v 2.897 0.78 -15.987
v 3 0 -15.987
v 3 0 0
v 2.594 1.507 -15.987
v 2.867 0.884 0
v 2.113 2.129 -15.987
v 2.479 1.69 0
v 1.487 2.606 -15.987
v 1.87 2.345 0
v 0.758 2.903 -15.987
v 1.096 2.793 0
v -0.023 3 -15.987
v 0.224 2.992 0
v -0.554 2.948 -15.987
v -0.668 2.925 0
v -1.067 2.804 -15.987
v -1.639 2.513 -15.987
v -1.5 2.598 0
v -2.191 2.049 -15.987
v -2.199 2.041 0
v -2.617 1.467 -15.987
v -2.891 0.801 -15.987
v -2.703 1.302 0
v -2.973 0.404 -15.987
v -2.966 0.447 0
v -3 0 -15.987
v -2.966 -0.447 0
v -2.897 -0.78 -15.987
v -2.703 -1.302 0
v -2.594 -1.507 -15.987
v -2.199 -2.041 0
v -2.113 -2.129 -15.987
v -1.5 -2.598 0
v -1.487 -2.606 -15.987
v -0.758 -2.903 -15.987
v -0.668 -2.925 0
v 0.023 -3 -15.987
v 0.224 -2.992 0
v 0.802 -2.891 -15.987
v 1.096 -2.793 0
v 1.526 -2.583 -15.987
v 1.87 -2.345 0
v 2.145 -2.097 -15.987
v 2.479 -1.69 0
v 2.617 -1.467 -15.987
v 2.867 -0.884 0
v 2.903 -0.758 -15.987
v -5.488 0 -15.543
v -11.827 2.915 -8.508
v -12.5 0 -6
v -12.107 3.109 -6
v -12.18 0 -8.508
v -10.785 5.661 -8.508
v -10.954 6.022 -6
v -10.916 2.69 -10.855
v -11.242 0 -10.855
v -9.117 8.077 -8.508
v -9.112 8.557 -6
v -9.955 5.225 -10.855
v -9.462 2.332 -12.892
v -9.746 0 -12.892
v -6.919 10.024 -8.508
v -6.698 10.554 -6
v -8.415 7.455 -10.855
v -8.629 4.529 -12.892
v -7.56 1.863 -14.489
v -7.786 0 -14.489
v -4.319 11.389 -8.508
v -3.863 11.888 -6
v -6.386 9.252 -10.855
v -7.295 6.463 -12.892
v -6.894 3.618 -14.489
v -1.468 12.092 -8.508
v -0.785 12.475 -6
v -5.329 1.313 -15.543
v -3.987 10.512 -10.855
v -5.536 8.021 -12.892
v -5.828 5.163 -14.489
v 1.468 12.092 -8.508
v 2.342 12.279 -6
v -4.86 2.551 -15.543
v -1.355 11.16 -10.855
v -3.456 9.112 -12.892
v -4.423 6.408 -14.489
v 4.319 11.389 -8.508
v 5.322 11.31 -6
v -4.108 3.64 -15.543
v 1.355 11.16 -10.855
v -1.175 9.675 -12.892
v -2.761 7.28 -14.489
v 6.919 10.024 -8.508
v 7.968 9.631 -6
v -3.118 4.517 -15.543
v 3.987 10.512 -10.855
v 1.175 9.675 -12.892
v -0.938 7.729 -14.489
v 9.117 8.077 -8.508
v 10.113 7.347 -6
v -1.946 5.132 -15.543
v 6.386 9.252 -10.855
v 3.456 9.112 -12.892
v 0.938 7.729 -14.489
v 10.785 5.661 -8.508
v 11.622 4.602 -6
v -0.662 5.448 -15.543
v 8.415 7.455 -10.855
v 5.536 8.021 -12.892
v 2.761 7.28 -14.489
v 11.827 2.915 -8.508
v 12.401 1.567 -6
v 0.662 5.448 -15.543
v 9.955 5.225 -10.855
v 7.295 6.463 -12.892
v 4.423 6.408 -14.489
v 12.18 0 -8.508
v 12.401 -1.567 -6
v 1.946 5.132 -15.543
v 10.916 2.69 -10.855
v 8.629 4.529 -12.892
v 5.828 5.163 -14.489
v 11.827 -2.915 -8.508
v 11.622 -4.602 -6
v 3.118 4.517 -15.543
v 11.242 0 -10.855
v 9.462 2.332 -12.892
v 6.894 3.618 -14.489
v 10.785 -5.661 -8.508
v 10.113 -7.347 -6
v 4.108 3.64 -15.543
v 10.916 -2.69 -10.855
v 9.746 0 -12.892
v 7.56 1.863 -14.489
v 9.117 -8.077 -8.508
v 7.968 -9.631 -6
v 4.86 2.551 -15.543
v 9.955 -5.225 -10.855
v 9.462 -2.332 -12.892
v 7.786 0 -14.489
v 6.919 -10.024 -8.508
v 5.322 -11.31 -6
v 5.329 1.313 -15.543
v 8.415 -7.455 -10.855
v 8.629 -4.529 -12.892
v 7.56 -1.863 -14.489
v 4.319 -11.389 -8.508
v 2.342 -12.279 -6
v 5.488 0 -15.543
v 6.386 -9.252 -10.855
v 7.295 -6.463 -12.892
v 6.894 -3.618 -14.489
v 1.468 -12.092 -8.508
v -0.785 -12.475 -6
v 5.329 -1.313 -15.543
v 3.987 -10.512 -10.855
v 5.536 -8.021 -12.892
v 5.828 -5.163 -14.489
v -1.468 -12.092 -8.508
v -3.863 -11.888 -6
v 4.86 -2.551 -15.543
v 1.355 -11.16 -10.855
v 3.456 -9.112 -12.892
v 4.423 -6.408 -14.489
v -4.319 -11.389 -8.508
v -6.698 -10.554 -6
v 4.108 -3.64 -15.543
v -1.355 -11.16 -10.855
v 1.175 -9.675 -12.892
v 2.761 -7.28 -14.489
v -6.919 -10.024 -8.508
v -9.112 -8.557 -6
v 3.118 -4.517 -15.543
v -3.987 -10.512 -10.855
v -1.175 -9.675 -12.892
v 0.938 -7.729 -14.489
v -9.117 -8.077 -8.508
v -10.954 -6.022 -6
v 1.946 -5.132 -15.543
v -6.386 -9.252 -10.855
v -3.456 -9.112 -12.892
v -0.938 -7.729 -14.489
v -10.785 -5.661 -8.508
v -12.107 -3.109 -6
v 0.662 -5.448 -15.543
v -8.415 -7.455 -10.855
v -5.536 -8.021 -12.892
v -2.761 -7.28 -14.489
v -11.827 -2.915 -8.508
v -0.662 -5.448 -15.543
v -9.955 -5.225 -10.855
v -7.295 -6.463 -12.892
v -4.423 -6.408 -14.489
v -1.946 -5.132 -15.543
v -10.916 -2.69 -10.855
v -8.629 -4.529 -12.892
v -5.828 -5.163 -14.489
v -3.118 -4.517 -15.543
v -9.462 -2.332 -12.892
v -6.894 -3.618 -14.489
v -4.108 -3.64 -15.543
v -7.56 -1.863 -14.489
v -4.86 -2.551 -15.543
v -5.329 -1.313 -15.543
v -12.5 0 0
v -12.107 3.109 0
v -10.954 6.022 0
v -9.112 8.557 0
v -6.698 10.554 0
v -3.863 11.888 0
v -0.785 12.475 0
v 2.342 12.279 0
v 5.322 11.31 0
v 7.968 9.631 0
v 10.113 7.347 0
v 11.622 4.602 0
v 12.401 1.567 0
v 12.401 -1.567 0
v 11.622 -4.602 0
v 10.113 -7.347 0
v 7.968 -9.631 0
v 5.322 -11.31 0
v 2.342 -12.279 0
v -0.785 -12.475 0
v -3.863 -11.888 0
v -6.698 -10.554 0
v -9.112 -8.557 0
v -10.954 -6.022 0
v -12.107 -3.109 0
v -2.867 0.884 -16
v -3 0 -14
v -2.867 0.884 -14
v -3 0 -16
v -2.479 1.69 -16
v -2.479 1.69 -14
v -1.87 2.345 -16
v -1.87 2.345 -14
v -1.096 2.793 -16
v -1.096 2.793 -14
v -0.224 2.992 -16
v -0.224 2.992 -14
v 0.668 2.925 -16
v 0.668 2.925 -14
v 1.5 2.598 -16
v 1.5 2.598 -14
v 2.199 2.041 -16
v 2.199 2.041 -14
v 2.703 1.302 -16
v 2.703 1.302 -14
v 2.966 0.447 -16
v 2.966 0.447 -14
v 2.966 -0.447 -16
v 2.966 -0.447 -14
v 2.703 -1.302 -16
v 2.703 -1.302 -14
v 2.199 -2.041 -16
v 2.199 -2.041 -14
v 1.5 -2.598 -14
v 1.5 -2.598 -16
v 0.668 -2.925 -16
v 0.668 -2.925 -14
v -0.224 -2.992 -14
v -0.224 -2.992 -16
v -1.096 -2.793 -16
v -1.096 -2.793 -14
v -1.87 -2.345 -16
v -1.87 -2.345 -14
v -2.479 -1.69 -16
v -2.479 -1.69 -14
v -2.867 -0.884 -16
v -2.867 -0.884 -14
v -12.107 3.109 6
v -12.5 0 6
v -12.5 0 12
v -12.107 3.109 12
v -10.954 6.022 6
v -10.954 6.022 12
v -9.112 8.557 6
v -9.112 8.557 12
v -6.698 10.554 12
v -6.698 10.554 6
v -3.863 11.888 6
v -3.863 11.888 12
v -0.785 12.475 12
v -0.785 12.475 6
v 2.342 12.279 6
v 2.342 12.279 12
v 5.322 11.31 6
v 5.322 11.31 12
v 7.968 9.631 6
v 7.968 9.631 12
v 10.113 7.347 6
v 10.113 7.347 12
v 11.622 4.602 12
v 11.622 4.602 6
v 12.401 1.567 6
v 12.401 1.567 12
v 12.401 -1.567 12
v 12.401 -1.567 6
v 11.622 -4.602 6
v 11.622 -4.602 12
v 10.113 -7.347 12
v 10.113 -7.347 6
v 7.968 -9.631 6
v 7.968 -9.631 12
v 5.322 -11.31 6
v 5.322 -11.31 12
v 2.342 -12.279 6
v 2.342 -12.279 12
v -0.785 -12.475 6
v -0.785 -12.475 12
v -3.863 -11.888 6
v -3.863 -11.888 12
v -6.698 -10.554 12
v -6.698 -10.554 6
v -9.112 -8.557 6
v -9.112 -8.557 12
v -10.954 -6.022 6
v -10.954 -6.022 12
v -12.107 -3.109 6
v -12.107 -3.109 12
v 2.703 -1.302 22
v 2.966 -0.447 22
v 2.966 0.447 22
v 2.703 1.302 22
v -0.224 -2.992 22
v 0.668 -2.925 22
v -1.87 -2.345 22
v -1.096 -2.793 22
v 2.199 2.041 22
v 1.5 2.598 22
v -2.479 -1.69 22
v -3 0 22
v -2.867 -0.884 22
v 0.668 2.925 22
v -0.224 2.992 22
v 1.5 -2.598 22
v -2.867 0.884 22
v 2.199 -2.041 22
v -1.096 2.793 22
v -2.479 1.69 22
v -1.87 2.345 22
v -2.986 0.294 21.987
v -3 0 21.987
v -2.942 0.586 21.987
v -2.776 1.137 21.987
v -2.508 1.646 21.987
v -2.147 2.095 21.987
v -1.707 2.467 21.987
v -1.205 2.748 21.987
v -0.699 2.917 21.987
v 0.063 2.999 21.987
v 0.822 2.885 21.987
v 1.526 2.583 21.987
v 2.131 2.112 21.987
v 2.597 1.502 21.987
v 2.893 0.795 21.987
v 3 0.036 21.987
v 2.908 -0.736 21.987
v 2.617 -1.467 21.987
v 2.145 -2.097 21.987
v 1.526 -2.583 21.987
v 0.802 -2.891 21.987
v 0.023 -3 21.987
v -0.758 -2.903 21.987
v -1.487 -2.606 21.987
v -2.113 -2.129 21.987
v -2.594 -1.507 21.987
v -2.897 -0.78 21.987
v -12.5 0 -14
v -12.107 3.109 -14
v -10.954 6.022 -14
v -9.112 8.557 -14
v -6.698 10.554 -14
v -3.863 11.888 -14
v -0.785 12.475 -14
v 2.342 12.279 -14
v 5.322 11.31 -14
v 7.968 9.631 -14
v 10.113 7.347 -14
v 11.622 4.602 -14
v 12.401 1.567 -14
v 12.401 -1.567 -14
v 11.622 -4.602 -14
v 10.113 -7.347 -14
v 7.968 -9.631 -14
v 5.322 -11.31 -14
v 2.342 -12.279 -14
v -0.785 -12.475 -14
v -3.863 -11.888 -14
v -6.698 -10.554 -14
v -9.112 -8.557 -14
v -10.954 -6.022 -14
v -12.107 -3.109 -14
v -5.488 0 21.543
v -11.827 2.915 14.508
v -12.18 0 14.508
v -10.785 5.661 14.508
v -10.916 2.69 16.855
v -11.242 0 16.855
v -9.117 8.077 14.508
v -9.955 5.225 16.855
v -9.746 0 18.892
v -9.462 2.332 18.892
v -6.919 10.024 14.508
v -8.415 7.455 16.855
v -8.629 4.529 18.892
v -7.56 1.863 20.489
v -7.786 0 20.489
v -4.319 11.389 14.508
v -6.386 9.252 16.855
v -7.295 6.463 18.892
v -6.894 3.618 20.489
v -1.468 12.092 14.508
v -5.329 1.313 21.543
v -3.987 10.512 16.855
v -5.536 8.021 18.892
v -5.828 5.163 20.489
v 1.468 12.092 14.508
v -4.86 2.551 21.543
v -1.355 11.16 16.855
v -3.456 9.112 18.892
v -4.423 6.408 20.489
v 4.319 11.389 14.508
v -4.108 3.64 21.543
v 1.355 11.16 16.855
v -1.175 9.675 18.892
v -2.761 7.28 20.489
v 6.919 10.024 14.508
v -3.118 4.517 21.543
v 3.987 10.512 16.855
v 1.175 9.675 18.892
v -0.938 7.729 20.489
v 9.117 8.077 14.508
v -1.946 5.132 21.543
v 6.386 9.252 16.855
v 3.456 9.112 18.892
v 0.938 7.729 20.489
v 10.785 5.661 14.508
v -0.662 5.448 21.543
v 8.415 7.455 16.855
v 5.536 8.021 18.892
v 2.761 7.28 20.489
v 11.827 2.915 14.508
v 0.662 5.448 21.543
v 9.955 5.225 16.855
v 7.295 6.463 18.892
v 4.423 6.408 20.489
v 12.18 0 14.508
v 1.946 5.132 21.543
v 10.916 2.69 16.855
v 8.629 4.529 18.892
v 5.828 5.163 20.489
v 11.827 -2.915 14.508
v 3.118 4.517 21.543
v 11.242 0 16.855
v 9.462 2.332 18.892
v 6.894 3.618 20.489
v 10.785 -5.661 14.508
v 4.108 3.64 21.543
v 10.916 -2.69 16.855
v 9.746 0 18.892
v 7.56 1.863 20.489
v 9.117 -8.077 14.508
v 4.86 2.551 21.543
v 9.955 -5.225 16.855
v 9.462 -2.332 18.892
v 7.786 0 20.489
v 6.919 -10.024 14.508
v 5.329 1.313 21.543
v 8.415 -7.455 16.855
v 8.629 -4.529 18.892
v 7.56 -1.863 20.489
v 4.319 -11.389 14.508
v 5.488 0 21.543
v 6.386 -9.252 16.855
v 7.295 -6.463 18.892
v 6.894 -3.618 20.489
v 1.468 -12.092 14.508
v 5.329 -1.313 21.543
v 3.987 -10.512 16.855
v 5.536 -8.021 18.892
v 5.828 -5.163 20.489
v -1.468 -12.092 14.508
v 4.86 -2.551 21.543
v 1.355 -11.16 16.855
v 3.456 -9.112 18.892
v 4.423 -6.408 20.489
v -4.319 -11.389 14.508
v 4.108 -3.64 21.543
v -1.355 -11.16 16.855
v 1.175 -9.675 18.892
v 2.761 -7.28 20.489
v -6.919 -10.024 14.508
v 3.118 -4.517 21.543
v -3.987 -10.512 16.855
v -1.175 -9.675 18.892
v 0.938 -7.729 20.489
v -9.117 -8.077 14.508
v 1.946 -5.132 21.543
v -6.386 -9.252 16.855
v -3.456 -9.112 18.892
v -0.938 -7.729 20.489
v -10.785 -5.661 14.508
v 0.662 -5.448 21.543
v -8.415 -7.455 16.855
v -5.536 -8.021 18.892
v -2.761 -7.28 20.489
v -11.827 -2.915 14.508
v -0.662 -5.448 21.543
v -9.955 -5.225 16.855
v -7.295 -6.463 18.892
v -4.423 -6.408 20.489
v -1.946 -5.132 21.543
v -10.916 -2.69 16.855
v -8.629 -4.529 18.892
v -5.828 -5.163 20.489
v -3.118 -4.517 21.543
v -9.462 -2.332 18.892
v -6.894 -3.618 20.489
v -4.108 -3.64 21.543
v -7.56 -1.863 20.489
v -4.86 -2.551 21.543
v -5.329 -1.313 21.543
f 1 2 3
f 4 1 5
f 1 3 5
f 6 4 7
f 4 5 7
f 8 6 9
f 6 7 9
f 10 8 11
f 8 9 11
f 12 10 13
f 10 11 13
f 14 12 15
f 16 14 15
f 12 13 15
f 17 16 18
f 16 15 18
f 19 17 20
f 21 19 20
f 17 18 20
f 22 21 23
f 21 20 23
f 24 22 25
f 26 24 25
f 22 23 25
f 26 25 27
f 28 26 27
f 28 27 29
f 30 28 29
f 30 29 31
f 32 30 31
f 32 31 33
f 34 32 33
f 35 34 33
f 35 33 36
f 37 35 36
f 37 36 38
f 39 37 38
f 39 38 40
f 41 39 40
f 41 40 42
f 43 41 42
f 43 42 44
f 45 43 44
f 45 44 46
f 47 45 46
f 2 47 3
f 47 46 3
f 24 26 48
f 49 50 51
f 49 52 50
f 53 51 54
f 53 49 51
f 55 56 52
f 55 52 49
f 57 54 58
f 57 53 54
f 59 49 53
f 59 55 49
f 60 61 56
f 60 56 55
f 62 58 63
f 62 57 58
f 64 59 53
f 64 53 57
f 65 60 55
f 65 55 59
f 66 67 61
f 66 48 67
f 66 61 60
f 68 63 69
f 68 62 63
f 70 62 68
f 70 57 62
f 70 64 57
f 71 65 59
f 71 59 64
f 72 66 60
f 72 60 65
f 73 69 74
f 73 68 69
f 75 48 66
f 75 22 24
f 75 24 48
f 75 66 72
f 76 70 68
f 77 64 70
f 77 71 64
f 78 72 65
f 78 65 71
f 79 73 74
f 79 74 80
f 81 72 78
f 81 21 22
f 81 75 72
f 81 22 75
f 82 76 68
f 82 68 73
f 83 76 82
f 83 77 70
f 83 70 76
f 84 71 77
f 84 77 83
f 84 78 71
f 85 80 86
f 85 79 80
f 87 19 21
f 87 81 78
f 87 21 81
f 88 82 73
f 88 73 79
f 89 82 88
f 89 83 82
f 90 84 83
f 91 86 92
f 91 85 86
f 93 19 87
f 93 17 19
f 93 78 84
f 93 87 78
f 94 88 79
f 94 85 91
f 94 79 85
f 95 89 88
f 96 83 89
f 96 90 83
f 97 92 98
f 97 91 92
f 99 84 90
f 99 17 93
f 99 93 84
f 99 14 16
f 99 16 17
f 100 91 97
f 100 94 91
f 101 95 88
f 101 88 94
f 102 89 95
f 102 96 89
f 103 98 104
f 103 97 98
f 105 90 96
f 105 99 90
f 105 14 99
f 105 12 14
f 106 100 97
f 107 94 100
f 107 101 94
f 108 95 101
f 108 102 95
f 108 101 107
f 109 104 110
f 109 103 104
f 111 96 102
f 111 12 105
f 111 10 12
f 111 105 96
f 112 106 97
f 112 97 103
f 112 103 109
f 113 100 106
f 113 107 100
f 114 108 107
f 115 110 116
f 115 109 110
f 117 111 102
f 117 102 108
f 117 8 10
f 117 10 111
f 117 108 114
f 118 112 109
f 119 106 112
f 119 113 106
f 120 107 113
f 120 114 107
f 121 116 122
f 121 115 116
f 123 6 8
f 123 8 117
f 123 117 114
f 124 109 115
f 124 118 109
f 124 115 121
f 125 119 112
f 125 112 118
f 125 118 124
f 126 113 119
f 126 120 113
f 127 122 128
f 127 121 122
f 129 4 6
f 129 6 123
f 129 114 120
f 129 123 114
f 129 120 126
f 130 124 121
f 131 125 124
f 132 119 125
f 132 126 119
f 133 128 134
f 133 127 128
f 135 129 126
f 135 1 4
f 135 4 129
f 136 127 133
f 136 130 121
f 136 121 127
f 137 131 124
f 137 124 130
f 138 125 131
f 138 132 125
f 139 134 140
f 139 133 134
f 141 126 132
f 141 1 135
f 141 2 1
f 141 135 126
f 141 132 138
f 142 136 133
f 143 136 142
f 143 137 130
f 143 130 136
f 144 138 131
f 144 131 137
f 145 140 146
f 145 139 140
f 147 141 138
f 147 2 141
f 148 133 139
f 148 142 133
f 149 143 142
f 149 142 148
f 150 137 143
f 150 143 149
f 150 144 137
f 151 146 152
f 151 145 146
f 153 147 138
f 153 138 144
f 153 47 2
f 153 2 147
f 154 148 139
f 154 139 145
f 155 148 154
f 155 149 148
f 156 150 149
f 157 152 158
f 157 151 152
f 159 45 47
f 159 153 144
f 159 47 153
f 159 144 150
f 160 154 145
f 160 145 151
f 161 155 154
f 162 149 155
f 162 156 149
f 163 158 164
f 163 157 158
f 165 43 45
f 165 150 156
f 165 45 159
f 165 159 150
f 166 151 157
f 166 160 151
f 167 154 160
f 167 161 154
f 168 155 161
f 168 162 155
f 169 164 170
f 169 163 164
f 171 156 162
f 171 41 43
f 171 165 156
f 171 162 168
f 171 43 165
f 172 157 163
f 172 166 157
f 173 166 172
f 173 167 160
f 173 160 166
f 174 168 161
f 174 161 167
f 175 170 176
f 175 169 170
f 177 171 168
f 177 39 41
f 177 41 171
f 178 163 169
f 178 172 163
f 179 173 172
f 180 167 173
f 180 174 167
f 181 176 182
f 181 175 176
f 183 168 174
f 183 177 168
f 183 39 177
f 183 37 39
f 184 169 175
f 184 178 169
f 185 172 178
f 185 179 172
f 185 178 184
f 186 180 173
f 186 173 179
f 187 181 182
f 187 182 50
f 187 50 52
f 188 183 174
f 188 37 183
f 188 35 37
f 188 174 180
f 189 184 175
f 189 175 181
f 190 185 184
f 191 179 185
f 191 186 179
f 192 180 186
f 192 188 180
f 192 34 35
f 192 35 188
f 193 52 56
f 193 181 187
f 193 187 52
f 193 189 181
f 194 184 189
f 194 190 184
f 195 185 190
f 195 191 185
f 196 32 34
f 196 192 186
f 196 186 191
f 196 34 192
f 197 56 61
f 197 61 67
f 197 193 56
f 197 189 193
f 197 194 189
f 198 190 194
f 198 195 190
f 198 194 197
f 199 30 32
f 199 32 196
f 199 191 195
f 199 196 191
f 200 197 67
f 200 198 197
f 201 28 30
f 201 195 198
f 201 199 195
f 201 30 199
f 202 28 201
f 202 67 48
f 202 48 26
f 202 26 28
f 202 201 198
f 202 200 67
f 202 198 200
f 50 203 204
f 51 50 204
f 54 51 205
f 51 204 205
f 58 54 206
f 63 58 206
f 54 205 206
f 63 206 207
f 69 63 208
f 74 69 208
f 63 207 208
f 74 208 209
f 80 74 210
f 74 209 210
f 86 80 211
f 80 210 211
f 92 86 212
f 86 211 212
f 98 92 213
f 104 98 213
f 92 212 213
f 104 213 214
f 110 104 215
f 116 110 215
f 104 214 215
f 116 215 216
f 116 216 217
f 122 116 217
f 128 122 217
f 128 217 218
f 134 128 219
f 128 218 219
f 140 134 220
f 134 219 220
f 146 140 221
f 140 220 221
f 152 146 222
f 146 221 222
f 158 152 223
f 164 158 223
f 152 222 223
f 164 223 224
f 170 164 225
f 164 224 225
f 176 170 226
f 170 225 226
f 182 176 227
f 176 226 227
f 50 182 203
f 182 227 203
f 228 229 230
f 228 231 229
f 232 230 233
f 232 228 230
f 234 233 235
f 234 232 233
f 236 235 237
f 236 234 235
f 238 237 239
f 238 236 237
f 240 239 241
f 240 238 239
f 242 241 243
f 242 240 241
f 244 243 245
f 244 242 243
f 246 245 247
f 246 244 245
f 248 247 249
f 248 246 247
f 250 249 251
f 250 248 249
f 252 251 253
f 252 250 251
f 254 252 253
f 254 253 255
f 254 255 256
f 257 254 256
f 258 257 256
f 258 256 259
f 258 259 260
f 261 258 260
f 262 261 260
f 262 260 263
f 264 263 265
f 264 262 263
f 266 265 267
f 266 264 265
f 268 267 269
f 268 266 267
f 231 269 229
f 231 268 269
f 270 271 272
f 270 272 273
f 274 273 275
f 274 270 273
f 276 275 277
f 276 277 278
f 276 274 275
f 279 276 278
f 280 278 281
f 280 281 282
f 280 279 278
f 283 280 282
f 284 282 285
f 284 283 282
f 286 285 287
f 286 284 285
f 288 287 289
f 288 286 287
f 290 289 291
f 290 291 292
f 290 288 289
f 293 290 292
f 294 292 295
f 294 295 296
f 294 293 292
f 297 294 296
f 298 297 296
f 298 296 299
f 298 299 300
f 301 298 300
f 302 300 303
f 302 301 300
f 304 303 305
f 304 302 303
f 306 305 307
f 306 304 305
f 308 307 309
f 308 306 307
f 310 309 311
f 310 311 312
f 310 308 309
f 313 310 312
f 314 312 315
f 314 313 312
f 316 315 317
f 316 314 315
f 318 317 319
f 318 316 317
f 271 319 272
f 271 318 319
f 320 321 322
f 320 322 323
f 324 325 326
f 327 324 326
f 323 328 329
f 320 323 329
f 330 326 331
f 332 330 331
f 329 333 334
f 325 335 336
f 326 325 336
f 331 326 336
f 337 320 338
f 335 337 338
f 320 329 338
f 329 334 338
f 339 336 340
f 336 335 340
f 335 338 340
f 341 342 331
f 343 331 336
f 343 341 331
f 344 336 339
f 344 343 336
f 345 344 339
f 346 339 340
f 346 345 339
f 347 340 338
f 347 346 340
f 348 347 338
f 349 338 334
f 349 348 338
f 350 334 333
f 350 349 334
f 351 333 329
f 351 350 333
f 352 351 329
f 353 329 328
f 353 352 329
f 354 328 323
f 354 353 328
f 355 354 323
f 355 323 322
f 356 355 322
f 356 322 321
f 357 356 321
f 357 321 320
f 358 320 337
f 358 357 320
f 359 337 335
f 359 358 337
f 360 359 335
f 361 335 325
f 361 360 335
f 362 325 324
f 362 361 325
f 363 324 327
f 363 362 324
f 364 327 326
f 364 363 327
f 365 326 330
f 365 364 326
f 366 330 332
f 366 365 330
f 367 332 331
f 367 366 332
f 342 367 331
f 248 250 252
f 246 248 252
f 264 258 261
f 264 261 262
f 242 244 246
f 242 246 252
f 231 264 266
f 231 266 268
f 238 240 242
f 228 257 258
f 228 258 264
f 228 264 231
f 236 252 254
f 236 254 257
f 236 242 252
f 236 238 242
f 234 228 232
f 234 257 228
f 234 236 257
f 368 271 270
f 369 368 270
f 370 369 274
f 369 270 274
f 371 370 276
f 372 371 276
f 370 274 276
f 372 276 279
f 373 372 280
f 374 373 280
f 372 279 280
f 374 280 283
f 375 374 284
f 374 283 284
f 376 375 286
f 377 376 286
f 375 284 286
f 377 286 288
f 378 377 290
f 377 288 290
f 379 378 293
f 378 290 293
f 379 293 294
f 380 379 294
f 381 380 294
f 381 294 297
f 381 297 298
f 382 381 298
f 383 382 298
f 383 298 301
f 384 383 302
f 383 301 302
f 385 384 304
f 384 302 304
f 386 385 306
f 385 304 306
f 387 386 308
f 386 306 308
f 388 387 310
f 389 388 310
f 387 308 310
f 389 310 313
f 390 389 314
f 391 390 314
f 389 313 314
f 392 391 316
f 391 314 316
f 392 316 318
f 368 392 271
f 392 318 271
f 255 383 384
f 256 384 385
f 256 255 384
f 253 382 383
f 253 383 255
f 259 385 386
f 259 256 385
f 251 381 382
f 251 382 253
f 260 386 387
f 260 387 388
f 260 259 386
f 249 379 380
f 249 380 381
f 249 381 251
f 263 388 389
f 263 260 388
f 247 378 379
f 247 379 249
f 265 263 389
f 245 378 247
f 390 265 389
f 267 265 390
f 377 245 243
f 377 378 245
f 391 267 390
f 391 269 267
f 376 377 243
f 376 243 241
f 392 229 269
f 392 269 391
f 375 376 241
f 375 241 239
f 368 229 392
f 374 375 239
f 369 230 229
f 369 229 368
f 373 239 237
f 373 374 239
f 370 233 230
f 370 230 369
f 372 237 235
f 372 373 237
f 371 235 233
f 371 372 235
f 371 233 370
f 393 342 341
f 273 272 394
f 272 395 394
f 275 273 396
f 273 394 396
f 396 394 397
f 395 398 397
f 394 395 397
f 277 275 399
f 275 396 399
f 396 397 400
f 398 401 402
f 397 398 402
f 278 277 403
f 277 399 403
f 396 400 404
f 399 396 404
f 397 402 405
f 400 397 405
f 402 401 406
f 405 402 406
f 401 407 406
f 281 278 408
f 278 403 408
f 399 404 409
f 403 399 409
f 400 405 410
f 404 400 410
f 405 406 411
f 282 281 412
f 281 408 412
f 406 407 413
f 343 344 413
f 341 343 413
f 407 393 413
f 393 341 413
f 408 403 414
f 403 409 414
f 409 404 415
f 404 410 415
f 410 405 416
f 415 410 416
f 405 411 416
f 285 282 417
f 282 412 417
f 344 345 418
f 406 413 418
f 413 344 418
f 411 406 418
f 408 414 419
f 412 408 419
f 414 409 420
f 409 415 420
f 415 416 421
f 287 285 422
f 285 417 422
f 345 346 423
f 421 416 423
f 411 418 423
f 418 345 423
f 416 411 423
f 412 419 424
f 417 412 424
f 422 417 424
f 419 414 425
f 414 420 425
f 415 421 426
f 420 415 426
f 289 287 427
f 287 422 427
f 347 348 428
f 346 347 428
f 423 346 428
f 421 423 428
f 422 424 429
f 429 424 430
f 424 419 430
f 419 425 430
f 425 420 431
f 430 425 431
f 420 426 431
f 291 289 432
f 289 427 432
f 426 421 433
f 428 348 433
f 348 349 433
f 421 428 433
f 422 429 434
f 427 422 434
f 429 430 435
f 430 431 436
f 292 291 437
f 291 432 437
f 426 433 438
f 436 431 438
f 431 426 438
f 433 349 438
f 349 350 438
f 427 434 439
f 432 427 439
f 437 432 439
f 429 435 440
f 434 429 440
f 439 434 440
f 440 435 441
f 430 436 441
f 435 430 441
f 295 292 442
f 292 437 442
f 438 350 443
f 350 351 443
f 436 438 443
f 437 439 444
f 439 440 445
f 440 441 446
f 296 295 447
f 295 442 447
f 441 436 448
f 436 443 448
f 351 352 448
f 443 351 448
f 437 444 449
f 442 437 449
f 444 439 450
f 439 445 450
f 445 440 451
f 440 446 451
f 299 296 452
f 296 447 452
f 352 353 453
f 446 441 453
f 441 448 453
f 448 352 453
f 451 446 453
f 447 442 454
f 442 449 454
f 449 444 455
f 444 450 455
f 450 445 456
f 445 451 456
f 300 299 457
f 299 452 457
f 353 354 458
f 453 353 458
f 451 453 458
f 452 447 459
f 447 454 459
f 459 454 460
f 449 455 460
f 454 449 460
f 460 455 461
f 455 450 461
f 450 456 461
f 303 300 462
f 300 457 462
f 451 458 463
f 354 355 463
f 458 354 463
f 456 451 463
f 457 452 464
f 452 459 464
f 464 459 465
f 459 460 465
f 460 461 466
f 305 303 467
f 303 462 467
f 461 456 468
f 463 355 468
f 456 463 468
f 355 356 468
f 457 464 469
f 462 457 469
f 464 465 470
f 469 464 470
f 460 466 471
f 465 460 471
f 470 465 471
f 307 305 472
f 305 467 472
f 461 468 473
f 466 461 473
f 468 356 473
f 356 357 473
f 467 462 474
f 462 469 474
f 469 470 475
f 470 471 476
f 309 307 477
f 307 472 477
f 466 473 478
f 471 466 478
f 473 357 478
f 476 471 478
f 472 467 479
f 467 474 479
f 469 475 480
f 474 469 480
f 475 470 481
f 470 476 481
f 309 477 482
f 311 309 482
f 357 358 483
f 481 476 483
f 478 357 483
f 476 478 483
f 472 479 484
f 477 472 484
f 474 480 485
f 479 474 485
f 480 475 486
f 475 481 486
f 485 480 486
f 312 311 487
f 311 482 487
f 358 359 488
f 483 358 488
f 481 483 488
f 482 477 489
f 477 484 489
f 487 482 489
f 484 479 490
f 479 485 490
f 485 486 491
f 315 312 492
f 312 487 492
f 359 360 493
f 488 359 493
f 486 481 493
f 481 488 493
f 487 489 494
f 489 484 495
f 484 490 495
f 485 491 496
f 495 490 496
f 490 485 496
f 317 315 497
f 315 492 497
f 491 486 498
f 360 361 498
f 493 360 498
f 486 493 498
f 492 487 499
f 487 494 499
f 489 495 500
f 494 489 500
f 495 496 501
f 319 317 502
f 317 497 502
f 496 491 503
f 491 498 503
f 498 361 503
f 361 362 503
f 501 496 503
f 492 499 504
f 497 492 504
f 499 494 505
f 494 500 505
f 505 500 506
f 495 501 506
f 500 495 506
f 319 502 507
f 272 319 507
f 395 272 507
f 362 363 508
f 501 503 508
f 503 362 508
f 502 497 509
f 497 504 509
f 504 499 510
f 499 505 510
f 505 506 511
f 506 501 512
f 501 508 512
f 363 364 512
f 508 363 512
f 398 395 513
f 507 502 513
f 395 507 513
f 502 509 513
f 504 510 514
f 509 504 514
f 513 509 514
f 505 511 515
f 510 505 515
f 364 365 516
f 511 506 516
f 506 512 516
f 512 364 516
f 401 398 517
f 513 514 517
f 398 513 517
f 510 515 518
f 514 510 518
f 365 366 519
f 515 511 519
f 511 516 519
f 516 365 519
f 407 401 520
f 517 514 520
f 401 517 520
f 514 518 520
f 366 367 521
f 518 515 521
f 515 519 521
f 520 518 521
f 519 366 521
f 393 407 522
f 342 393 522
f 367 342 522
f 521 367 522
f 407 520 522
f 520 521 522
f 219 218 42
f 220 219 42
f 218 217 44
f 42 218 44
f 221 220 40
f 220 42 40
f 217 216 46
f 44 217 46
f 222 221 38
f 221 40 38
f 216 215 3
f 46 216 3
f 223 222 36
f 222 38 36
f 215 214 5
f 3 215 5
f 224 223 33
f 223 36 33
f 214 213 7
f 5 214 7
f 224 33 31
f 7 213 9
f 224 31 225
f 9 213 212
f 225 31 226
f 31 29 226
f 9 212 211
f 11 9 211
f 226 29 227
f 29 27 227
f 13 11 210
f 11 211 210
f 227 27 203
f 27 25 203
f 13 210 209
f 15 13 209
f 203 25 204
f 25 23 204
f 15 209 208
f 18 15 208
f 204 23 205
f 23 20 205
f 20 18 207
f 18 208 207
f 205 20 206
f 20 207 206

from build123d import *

# Parameters (mm, degrees)
CROQUIS1_R                   = 9.5
CROQUIS1_R_2                 = 3
SALIENTE_EXTRUIR1_DEPTH      = 6
CROQUIS3_R                   = 12.5
SALIENTE_EXTRUIR3_DEPTH      = 16
REDONDEO1_R                  = 10
CROQUIS5_R                   = 3
CORTAR_EXTRUIR1_DEPTH        = 20
CROQUIS6_R                   = 3
SALIENTE_EXTRUIR4_DEPTH      = 22
SALIENTE_EXTRUIR4_DEPTH_BACK = 16
CROQUIS9_R                   = 12.5
SALIENTE_EXTRUIR5_DEPTH      = 20


with BuildPart() as part:
    # Croquis1 → Saliente-Extruir1 (new body)
    with BuildSketch(Plane.XY):
        Circle(CROQUIS1_R)
        Circle(CROQUIS1_R_2, mode=Mode.SUBTRACT)
    extrude(amount=SALIENTE_EXTRUIR1_DEPTH)



with BuildPart() as body_2:
    # Croquis3 → Saliente-Extruir3 (new body)
    with BuildSketch(Plane(origin=(0, 0, 0), x_dir=(-1, 0, 0), z_dir=(0, 0, -1))):
        Circle(CROQUIS3_R)
    extrude(amount=SALIENTE_EXTRUIR3_DEPTH)

    # Redondeo1
    redondeo1_edges = [body_2.edges().sort_by_distance(p)[0] for p in [
        (12.5, 0, -16),
    ]]
    fillet(redondeo1_edges, radius=REDONDEO1_R)

    # Croquis5 → Cortar-Extruir1 (cut)
    with BuildSketch(Plane.XY):
        Circle(CROQUIS5_R)
    extrude(amount=-CORTAR_EXTRUIR1_DEPTH, mode=Mode.SUBTRACT)


with BuildPart() as body_3:
    # Simetría1: mirrored copy
    add(body_2.part.mirror(Plane(origin=(0, 0, 3), x_dir=(1, 0, 0), z_dir=(0, 0, -1))))


with BuildPart() as body_4:
    # Croquis6 → Saliente-Extruir4 (new body, two sides)
    with BuildSketch(Plane(origin=(0, 0, 6), x_dir=(-1, 0, 0), z_dir=(0, 0, -1))) as saliente_extruir4_sk:
        Circle(CROQUIS6_R)
    extrude(amount=SALIENTE_EXTRUIR4_DEPTH)
    extrude(saliente_extruir4_sk.sketch, amount=-SALIENTE_EXTRUIR4_DEPTH_BACK)


with BuildPart() as part_1:
    add(part.part)

    add(body_3.part)  # Saliente-Extruir5 merges body 3

    add(body_4.part)  # Saliente-Extruir5 merges body 4
    # Croquis9 → Saliente-Extruir5 (add)
    with BuildSketch(Plane(origin=(0, 0, 6), x_dir=(-1, 0, 0), z_dir=(0, 0, -1))):
        Circle(CROQUIS9_R)
    extrude(amount=SALIENTE_EXTRUIR5_DEPTH)


solid = Compound([body_2.part, part_1.part])
